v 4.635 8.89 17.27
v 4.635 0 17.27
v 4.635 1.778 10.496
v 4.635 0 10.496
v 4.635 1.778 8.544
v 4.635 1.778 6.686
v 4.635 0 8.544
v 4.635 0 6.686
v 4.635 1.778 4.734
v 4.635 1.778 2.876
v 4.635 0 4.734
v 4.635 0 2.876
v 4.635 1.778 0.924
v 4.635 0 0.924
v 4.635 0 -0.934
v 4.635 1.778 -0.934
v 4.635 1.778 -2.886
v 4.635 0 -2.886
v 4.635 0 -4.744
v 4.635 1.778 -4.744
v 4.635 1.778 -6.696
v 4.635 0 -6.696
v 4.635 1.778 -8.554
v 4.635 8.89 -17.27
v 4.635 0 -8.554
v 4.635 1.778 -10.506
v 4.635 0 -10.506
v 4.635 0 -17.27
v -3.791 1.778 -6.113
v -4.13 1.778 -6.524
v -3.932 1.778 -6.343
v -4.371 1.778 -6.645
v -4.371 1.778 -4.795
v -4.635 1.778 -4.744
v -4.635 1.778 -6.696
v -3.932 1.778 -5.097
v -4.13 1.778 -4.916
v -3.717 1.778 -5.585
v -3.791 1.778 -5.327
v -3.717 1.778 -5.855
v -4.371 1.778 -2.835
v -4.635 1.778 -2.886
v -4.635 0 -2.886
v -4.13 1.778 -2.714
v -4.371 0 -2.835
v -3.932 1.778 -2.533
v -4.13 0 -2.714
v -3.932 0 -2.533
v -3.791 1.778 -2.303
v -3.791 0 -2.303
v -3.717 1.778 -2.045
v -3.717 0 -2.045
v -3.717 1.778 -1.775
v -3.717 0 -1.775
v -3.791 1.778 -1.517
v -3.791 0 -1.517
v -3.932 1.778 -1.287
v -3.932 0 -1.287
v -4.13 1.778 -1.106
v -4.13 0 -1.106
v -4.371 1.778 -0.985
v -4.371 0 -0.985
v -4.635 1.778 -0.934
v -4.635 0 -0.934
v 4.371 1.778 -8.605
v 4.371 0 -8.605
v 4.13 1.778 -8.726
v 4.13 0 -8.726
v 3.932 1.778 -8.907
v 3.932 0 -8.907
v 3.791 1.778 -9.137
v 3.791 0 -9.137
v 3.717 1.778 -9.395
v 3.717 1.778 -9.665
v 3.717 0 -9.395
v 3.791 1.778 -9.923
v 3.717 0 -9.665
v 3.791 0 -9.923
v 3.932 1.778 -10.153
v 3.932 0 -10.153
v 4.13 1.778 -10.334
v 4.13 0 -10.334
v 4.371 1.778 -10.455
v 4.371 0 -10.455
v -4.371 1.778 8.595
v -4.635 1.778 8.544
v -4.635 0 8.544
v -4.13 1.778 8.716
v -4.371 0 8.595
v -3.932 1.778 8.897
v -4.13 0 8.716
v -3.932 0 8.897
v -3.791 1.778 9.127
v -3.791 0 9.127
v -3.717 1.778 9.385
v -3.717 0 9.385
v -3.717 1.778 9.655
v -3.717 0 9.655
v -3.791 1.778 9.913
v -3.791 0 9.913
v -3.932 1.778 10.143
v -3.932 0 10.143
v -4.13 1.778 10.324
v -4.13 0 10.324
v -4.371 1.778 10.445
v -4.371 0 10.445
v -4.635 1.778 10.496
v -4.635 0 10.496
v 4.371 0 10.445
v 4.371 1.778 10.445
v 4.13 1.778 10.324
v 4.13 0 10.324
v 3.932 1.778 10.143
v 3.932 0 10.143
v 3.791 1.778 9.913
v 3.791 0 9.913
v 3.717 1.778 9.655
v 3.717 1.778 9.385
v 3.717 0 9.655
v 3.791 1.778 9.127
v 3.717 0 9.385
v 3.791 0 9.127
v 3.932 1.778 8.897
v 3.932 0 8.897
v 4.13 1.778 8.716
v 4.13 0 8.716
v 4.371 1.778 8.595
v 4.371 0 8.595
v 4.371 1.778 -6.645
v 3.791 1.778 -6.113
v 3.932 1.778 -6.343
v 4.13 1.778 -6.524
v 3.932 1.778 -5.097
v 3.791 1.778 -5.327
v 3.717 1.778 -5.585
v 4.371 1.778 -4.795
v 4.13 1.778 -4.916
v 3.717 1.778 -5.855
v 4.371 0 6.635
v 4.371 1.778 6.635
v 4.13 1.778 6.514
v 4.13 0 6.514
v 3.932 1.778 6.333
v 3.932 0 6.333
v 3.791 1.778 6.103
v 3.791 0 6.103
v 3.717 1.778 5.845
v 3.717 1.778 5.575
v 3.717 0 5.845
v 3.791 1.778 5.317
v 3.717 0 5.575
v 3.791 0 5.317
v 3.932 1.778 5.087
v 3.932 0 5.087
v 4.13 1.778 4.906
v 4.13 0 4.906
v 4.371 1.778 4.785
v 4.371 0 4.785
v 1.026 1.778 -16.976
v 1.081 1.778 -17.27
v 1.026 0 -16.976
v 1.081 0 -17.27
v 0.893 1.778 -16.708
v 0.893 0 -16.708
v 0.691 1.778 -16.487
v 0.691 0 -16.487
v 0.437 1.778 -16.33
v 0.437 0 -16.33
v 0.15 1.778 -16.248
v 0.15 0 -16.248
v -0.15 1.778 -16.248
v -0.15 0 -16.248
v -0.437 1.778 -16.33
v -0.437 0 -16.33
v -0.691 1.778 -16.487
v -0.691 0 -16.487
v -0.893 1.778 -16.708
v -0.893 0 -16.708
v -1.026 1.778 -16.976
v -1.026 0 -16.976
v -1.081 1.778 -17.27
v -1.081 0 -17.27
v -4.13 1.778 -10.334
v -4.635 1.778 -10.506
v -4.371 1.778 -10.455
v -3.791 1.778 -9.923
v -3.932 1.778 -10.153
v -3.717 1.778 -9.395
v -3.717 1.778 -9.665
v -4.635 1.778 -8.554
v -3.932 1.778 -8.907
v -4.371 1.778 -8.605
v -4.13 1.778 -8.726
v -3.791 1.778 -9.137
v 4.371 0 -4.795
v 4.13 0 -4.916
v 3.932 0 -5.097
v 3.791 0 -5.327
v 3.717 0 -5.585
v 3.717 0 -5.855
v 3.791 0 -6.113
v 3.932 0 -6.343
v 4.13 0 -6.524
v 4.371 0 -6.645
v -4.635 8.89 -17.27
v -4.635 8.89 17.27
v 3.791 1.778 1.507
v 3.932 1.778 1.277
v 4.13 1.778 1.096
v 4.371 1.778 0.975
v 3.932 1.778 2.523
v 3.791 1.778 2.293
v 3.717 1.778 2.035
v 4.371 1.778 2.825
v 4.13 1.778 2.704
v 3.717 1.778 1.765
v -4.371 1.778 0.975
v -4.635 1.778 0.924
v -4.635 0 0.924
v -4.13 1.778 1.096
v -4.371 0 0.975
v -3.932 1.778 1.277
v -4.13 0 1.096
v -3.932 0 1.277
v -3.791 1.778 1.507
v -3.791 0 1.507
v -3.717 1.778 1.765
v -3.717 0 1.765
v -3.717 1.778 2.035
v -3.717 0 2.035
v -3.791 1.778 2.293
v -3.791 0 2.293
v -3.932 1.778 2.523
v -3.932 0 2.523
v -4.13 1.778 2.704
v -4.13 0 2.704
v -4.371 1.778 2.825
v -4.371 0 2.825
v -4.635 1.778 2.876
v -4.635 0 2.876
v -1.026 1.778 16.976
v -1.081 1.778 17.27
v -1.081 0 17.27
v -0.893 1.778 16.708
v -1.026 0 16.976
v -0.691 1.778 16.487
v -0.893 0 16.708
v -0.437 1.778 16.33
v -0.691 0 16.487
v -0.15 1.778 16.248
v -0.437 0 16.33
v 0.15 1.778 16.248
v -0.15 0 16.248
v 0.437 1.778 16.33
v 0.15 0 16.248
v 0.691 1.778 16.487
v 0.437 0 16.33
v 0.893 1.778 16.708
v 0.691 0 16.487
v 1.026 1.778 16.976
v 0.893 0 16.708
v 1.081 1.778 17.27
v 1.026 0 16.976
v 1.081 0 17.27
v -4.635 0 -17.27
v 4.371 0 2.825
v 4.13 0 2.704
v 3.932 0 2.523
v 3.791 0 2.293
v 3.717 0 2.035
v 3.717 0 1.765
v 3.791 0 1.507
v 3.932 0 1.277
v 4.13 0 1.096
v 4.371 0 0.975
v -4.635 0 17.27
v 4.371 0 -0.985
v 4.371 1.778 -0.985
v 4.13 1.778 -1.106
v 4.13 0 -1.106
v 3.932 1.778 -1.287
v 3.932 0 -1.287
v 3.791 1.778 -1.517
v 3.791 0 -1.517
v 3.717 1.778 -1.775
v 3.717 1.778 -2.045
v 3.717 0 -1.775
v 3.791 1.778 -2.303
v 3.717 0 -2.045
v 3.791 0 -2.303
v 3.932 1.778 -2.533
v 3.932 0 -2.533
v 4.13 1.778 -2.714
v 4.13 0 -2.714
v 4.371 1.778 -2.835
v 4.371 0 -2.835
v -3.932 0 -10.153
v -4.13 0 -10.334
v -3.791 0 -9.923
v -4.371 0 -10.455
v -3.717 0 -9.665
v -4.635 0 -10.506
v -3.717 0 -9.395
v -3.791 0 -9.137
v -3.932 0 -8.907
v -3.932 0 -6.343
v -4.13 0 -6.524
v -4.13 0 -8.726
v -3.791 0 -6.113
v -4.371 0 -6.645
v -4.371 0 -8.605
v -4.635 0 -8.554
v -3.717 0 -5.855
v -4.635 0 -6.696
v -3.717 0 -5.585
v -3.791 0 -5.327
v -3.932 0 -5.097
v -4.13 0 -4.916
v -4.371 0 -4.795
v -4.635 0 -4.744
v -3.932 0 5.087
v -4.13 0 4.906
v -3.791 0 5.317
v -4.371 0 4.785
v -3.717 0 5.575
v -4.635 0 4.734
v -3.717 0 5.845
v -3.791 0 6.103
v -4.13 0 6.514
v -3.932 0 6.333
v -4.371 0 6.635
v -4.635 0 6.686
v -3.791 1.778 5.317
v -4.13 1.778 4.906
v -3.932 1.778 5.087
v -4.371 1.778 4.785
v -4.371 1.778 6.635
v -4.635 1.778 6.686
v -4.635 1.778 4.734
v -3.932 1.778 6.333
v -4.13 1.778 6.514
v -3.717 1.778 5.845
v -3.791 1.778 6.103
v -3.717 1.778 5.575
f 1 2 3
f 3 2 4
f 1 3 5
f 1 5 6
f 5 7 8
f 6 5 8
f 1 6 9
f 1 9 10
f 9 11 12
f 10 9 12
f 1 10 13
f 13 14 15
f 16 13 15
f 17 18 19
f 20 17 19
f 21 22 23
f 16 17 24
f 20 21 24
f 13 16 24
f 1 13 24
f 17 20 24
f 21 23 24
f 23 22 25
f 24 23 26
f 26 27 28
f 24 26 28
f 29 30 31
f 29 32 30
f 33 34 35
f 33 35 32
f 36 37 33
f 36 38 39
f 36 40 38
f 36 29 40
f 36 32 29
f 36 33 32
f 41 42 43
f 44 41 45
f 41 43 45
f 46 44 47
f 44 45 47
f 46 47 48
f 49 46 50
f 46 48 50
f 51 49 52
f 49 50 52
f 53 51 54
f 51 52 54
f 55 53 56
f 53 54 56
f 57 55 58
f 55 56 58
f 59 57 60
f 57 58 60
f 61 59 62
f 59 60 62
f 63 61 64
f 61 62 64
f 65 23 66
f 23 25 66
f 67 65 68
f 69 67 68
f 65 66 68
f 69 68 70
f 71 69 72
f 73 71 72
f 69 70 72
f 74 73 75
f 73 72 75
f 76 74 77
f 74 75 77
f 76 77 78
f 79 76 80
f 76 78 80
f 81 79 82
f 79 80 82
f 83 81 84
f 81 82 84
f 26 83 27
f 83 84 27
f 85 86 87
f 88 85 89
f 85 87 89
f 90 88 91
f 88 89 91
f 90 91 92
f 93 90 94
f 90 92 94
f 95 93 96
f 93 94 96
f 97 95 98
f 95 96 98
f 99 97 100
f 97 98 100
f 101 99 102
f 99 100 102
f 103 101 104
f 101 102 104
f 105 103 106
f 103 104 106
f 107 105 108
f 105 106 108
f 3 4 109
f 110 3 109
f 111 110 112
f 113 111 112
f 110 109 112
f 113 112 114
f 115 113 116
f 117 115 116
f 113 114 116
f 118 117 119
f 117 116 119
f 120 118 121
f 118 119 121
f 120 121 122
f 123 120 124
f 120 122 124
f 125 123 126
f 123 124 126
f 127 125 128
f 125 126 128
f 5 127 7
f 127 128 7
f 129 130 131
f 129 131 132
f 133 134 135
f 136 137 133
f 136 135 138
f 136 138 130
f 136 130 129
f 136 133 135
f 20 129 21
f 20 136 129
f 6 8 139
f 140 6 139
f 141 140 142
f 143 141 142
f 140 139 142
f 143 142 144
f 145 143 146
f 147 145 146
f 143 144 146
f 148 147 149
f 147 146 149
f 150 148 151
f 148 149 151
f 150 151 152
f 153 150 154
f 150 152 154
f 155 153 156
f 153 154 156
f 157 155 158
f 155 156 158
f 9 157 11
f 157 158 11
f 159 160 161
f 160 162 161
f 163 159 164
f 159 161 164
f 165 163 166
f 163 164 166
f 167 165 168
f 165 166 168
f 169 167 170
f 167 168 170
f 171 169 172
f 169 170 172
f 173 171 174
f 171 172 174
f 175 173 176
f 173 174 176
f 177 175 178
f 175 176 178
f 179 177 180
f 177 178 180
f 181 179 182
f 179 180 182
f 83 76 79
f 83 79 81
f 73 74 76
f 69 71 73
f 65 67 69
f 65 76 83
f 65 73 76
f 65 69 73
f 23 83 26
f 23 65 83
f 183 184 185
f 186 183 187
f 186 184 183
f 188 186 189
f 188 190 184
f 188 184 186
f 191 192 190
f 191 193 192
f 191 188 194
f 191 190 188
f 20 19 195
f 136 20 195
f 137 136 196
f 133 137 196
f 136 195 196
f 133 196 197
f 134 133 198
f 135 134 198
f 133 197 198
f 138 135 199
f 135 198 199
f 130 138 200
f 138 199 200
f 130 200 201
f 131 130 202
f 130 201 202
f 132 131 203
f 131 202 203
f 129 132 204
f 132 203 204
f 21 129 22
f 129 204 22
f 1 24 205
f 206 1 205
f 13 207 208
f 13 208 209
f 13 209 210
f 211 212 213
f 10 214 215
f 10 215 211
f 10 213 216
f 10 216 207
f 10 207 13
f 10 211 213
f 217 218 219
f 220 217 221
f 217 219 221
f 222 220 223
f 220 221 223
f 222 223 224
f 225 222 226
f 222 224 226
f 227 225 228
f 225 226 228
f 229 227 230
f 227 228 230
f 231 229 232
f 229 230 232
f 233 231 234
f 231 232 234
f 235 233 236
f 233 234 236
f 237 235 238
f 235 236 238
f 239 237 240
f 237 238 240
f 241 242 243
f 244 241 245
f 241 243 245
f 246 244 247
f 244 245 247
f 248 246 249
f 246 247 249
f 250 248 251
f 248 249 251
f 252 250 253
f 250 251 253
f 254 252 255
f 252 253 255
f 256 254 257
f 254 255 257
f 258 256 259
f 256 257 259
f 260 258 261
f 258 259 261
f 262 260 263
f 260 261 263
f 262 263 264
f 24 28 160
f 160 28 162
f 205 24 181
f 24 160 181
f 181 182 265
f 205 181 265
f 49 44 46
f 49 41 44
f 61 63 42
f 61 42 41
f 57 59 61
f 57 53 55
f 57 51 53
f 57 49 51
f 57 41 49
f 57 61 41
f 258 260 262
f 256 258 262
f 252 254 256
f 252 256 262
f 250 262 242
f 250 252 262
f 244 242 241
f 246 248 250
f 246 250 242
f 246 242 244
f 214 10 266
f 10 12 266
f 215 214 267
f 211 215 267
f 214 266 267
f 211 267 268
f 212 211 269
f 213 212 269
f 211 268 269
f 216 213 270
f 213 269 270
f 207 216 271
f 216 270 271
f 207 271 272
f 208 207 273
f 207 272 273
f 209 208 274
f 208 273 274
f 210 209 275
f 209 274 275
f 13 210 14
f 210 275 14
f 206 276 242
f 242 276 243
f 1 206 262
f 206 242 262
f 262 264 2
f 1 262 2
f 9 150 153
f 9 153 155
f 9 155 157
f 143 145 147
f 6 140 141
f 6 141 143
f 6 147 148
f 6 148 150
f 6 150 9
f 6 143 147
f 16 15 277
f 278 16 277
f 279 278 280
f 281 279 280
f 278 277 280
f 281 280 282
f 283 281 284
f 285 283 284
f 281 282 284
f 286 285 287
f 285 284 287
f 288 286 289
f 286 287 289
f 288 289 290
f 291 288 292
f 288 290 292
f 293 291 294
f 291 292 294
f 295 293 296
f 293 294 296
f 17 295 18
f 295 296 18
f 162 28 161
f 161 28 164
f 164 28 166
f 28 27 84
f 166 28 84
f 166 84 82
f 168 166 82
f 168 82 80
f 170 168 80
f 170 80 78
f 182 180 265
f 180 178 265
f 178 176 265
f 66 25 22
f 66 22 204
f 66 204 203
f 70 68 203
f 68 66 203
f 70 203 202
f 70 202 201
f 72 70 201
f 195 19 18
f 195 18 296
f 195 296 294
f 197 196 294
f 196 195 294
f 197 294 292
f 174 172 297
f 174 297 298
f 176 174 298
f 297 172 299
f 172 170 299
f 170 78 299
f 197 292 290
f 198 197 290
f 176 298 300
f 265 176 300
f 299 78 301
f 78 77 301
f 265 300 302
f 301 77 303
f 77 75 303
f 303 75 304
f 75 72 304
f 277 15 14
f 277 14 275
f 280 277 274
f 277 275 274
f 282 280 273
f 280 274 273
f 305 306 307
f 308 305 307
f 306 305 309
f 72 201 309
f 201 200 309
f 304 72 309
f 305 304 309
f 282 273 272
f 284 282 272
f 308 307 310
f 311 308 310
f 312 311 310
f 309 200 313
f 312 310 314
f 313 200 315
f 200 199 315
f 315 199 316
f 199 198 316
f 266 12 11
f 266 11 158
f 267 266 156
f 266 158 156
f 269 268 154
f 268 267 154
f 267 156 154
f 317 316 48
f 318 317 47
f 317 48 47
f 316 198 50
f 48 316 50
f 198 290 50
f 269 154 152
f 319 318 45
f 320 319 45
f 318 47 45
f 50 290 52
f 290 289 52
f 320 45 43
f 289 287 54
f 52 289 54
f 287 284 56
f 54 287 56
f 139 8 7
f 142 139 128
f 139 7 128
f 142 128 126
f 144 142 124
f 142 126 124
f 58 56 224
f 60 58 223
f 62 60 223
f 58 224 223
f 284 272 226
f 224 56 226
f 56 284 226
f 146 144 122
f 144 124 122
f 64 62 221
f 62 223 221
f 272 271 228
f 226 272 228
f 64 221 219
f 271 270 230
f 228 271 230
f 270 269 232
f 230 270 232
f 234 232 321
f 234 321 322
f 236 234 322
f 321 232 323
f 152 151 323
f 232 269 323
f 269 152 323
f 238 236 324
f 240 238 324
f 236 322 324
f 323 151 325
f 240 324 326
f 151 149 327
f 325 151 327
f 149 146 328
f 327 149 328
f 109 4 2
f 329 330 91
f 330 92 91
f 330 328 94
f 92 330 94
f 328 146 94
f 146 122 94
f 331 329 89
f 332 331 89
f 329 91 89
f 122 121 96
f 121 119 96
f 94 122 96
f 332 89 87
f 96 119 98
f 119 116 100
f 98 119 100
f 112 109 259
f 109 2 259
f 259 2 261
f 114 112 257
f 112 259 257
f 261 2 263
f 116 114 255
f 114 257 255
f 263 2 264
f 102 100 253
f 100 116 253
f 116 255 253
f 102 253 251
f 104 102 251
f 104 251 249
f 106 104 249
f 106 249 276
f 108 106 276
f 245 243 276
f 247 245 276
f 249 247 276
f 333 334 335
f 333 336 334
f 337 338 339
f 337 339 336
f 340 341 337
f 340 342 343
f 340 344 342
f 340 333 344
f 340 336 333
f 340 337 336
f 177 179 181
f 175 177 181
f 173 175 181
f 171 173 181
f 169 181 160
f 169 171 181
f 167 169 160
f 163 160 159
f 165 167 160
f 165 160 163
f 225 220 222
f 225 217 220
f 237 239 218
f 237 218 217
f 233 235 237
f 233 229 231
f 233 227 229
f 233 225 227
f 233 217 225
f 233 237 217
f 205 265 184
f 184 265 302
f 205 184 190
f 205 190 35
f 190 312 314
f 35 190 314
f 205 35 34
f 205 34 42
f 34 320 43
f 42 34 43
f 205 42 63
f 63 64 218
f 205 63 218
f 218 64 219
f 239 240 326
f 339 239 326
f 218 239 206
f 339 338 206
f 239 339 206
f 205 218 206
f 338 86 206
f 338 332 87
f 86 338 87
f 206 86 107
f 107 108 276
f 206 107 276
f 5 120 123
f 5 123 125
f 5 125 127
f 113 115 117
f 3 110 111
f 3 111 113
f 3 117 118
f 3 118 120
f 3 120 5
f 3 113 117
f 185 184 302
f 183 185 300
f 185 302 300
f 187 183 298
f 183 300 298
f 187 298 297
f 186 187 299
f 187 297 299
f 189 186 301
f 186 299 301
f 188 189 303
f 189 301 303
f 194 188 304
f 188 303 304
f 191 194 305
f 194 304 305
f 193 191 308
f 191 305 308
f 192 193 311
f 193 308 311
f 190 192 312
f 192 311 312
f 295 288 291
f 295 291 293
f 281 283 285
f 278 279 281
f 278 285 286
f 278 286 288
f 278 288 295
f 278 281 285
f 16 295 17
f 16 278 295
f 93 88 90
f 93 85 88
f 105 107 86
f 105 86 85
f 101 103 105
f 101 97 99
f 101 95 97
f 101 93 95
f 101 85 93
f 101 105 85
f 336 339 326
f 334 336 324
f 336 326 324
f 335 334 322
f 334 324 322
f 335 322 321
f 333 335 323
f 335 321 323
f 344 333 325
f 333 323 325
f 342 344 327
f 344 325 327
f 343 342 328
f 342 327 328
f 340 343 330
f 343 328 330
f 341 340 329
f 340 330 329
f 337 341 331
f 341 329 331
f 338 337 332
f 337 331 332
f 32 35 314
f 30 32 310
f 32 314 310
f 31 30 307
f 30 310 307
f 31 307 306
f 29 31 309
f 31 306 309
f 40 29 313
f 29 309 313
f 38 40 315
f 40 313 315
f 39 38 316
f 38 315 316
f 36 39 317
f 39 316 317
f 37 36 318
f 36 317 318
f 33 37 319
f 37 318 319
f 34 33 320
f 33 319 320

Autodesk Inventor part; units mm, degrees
ref_plane "YZ Plane" through (0, 0, 0) normal (1, 0, 0) x (0, 1, 0)
ref_plane "XZ Plane" through (0, 0, 0) normal (0, 1, 0) x (-1, 0, 0)
ref_plane "XY Plane" through (0, 0, 0) normal (0, 0, 1) x (1, 0, 0)
sketch "Sketch1" plane through (0, 0, 0) normal (0, 1, 0) x (-1, 0, 0)
  line L0 (4.635, 17.27) -> (-4.635, 17.27)
  line L1 (-4.635, 17.27) -> (-4.635, -17.27)
  line L2 (-4.635, -17.27) -> (4.635, -17.27)
  line L3 (4.635, -17.27) -> (4.635, 17.27)
  point P0 (0, 0)
  dimension "d0" = 9.27
  dimension "d1" = 4.635
  dimension "d2" = 34.54
  dimension "d3" = 17.27
extrude "Extrusion1" add sketch "Sketch1" along normal blind 8.89
sketch "Sketch2" plane through (0, 0, 0) normal (0, -1, 0) x (1, 0, 0)
  line L0 (4.685, 10.79) -> (2.145, 10.79)
  line L1 (2.145, 10.79) -> (2.145, 8.25)
  line L2 (2.145, 8.25) -> (4.685, 8.25)
  line L3 (4.685, 8.25) -> (4.685, 10.79)
  line L4 (4.635, 17.27) -> (4.635, -17.27) projected
  line L5 (-4.635, 17.27) -> (4.635, 17.27) projected
  circle A0 centre (4.685, 9.52) radius 0.9772
  point P0 (0, 0)
  dimension "d6" = 2.54
  dimension "d7" = 2.54
  dimension "d8" = 0.05
  dimension "d9" = 6.48
extrude "Extrusion2" cut sketch "Sketch2" against normal blind 1.778 contours A0 L3 | L3 A0 L4 | L4 A0
pattern_linear "Rectangular Pattern1" count 6 spacing 3.81 along (0, 0, -1) of "Extrusion2"
mirror "Mirror1" about plane through (0, 0, 0) normal (1, 0, 0) of "Extrusion2", "Rectangular Pattern1"
sketch "Sketch3" plane through (0, 0, 0) normal (0, -1, 0) x (1, 0, 0)
  line L0 (1.27, -14.78) -> (-1.27, -14.78)
  line L1 (-1.27, -14.78) -> (-1.27, -17.32)
  line L2 (-1.27, -17.32) -> (1.27, -17.32)
  line L3 (1.27, -17.32) -> (1.27, -14.78)
  line L4 (4.635, -17.27) -> (-4.635, -17.27) projected
  circle A0 centre (0, -17.32) radius 1.0823
  point P0 (0, 0)
  dimension "d15" = 2.54
  dimension "d16" = 1.27
  dimension "d17" = 2.54
  dimension "d18" = 0.05
extrude "Extrusion3" cut sketch "Sketch3" against normal blind 1.778 contours A0 L2 L4 | L4 A0 | A0 L2
mirror "Mirror2" about plane through (0, 0, 0) normal (0, 0, 1) of "Extrusion3"
properties part number "MC_HQ1157"
